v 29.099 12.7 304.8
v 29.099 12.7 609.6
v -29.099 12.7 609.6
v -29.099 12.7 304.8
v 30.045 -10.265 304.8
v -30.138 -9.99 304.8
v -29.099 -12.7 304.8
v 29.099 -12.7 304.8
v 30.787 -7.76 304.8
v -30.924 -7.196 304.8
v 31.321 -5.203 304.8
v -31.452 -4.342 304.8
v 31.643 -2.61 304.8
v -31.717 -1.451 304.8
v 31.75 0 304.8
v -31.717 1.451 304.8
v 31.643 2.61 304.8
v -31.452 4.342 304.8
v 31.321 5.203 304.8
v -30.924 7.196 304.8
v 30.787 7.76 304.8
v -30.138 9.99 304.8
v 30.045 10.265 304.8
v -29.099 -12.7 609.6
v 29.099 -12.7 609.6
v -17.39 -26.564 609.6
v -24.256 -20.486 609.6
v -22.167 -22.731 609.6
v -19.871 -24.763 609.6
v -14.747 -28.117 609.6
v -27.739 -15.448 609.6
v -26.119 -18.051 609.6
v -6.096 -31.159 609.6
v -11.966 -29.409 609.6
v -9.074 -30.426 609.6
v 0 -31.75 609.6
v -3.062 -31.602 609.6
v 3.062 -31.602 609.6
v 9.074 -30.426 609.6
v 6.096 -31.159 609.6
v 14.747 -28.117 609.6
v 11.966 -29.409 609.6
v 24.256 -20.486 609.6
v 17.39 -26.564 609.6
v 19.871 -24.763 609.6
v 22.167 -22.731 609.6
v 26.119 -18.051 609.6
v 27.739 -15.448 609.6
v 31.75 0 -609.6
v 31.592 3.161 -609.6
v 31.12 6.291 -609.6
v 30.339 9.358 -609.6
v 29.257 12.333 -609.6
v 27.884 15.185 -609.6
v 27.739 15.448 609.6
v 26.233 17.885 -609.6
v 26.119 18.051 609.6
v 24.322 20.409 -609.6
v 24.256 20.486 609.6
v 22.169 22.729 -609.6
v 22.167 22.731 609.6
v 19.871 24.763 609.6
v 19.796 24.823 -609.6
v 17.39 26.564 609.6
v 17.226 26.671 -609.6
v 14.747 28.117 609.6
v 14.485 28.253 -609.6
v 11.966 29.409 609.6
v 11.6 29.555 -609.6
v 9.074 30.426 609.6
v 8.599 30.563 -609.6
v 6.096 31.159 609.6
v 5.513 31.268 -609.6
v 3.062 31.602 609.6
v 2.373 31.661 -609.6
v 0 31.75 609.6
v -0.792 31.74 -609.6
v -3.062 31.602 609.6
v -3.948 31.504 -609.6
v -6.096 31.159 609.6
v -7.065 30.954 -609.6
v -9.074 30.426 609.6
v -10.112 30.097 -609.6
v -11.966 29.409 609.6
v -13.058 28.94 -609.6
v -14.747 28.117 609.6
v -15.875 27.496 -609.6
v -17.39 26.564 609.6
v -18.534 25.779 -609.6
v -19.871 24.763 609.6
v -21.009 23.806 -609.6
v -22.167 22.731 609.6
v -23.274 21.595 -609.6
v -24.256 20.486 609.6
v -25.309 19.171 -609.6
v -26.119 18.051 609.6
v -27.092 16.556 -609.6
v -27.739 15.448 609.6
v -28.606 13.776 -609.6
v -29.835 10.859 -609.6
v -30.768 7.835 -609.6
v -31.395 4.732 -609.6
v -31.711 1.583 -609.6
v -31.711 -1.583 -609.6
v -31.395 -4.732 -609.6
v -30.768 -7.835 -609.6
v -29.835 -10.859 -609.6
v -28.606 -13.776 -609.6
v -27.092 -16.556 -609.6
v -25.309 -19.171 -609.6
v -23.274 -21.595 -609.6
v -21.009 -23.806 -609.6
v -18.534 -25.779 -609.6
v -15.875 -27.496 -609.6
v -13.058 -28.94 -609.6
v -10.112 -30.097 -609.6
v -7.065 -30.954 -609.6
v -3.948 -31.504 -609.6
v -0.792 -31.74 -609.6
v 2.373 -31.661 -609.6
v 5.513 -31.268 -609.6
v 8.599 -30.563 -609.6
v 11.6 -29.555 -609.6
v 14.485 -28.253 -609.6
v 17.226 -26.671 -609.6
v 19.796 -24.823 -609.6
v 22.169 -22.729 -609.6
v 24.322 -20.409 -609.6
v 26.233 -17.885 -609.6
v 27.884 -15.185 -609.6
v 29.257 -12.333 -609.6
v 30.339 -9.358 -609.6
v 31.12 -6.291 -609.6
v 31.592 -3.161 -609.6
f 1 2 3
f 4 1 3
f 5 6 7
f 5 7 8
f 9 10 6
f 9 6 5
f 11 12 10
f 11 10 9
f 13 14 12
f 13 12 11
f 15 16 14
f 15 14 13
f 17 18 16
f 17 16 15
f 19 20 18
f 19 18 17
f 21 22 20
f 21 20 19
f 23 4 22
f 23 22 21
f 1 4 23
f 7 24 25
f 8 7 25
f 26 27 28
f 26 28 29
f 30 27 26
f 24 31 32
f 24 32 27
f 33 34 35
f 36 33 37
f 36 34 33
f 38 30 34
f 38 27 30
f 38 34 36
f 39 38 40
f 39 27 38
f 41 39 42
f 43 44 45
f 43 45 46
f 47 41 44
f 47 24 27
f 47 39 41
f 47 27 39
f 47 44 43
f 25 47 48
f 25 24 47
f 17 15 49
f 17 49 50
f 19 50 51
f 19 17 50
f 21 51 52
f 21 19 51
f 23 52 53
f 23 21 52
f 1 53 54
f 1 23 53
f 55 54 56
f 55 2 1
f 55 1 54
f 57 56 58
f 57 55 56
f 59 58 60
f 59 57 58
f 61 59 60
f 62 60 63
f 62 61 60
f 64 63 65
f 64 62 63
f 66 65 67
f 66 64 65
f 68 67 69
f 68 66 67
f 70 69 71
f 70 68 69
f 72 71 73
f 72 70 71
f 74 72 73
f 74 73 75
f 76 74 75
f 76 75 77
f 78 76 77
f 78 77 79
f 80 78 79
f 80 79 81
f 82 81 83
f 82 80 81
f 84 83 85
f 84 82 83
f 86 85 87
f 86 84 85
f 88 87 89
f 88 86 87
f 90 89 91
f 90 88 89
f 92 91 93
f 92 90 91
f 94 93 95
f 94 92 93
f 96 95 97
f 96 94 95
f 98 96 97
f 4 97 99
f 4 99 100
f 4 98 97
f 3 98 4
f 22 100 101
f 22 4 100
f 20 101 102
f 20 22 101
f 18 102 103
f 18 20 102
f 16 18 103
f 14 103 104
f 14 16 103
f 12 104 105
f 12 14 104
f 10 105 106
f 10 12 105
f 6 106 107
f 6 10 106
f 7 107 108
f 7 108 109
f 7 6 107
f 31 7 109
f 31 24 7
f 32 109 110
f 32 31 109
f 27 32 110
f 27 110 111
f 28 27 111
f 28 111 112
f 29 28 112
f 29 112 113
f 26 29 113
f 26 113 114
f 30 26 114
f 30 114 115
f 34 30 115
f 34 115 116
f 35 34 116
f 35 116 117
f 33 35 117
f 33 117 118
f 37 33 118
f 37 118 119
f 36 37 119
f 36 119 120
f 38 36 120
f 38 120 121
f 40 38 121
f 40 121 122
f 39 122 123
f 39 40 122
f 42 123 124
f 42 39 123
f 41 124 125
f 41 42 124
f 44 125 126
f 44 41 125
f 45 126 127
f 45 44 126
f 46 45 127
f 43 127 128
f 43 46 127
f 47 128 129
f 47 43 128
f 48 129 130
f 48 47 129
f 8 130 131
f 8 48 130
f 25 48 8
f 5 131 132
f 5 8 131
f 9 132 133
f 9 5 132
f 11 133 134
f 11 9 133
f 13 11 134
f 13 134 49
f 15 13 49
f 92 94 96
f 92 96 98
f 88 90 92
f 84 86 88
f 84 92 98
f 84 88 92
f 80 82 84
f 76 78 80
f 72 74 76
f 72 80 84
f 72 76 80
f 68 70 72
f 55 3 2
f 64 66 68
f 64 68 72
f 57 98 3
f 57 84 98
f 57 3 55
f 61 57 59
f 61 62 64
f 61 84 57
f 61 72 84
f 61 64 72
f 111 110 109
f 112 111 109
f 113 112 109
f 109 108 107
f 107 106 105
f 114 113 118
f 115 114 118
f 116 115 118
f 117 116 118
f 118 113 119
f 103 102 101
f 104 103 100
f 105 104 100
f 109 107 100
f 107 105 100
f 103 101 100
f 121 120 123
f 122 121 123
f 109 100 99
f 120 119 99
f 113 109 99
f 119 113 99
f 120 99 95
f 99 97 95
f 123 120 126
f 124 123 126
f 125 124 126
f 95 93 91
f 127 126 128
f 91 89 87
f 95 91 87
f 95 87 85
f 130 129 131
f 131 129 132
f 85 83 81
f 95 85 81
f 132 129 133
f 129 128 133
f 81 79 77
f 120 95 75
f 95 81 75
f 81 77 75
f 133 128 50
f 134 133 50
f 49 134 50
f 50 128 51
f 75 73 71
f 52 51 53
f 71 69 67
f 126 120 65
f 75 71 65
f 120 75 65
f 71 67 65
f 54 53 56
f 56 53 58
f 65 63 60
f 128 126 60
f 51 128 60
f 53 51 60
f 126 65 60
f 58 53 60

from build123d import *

# Parameters (mm, degrees)
F0_R     = 31.75
F1_DEPTH = 609.6
F3_DEPTH = 304.8


with BuildPart() as f1:
    # F0 (on Top) → F1 (new body, symmetric)
    with BuildSketch(Plane.XY):
        Circle(F0_R)
    extrude(amount=F1_DEPTH, both=True)

    # F2 (on face) → F3 (cut)
    with BuildSketch(Plane.XY.offset(609.6)):
        with BuildLine():
            Line((29.099356, 12.7), (-29.099356, 12.7))
            ThreePointArc((-29.099356, 12.7), (-31.75, 0), (-29.099356, -12.7))
            Line((-29.099356, -12.7), (29.099356, -12.7))
            ThreePointArc((29.099356, -12.7), (31.75, 0), (29.099356, 12.7))
        make_face()
    extrude(amount=-F3_DEPTH, mode=Mode.SUBTRACT)


solid = f1.part
